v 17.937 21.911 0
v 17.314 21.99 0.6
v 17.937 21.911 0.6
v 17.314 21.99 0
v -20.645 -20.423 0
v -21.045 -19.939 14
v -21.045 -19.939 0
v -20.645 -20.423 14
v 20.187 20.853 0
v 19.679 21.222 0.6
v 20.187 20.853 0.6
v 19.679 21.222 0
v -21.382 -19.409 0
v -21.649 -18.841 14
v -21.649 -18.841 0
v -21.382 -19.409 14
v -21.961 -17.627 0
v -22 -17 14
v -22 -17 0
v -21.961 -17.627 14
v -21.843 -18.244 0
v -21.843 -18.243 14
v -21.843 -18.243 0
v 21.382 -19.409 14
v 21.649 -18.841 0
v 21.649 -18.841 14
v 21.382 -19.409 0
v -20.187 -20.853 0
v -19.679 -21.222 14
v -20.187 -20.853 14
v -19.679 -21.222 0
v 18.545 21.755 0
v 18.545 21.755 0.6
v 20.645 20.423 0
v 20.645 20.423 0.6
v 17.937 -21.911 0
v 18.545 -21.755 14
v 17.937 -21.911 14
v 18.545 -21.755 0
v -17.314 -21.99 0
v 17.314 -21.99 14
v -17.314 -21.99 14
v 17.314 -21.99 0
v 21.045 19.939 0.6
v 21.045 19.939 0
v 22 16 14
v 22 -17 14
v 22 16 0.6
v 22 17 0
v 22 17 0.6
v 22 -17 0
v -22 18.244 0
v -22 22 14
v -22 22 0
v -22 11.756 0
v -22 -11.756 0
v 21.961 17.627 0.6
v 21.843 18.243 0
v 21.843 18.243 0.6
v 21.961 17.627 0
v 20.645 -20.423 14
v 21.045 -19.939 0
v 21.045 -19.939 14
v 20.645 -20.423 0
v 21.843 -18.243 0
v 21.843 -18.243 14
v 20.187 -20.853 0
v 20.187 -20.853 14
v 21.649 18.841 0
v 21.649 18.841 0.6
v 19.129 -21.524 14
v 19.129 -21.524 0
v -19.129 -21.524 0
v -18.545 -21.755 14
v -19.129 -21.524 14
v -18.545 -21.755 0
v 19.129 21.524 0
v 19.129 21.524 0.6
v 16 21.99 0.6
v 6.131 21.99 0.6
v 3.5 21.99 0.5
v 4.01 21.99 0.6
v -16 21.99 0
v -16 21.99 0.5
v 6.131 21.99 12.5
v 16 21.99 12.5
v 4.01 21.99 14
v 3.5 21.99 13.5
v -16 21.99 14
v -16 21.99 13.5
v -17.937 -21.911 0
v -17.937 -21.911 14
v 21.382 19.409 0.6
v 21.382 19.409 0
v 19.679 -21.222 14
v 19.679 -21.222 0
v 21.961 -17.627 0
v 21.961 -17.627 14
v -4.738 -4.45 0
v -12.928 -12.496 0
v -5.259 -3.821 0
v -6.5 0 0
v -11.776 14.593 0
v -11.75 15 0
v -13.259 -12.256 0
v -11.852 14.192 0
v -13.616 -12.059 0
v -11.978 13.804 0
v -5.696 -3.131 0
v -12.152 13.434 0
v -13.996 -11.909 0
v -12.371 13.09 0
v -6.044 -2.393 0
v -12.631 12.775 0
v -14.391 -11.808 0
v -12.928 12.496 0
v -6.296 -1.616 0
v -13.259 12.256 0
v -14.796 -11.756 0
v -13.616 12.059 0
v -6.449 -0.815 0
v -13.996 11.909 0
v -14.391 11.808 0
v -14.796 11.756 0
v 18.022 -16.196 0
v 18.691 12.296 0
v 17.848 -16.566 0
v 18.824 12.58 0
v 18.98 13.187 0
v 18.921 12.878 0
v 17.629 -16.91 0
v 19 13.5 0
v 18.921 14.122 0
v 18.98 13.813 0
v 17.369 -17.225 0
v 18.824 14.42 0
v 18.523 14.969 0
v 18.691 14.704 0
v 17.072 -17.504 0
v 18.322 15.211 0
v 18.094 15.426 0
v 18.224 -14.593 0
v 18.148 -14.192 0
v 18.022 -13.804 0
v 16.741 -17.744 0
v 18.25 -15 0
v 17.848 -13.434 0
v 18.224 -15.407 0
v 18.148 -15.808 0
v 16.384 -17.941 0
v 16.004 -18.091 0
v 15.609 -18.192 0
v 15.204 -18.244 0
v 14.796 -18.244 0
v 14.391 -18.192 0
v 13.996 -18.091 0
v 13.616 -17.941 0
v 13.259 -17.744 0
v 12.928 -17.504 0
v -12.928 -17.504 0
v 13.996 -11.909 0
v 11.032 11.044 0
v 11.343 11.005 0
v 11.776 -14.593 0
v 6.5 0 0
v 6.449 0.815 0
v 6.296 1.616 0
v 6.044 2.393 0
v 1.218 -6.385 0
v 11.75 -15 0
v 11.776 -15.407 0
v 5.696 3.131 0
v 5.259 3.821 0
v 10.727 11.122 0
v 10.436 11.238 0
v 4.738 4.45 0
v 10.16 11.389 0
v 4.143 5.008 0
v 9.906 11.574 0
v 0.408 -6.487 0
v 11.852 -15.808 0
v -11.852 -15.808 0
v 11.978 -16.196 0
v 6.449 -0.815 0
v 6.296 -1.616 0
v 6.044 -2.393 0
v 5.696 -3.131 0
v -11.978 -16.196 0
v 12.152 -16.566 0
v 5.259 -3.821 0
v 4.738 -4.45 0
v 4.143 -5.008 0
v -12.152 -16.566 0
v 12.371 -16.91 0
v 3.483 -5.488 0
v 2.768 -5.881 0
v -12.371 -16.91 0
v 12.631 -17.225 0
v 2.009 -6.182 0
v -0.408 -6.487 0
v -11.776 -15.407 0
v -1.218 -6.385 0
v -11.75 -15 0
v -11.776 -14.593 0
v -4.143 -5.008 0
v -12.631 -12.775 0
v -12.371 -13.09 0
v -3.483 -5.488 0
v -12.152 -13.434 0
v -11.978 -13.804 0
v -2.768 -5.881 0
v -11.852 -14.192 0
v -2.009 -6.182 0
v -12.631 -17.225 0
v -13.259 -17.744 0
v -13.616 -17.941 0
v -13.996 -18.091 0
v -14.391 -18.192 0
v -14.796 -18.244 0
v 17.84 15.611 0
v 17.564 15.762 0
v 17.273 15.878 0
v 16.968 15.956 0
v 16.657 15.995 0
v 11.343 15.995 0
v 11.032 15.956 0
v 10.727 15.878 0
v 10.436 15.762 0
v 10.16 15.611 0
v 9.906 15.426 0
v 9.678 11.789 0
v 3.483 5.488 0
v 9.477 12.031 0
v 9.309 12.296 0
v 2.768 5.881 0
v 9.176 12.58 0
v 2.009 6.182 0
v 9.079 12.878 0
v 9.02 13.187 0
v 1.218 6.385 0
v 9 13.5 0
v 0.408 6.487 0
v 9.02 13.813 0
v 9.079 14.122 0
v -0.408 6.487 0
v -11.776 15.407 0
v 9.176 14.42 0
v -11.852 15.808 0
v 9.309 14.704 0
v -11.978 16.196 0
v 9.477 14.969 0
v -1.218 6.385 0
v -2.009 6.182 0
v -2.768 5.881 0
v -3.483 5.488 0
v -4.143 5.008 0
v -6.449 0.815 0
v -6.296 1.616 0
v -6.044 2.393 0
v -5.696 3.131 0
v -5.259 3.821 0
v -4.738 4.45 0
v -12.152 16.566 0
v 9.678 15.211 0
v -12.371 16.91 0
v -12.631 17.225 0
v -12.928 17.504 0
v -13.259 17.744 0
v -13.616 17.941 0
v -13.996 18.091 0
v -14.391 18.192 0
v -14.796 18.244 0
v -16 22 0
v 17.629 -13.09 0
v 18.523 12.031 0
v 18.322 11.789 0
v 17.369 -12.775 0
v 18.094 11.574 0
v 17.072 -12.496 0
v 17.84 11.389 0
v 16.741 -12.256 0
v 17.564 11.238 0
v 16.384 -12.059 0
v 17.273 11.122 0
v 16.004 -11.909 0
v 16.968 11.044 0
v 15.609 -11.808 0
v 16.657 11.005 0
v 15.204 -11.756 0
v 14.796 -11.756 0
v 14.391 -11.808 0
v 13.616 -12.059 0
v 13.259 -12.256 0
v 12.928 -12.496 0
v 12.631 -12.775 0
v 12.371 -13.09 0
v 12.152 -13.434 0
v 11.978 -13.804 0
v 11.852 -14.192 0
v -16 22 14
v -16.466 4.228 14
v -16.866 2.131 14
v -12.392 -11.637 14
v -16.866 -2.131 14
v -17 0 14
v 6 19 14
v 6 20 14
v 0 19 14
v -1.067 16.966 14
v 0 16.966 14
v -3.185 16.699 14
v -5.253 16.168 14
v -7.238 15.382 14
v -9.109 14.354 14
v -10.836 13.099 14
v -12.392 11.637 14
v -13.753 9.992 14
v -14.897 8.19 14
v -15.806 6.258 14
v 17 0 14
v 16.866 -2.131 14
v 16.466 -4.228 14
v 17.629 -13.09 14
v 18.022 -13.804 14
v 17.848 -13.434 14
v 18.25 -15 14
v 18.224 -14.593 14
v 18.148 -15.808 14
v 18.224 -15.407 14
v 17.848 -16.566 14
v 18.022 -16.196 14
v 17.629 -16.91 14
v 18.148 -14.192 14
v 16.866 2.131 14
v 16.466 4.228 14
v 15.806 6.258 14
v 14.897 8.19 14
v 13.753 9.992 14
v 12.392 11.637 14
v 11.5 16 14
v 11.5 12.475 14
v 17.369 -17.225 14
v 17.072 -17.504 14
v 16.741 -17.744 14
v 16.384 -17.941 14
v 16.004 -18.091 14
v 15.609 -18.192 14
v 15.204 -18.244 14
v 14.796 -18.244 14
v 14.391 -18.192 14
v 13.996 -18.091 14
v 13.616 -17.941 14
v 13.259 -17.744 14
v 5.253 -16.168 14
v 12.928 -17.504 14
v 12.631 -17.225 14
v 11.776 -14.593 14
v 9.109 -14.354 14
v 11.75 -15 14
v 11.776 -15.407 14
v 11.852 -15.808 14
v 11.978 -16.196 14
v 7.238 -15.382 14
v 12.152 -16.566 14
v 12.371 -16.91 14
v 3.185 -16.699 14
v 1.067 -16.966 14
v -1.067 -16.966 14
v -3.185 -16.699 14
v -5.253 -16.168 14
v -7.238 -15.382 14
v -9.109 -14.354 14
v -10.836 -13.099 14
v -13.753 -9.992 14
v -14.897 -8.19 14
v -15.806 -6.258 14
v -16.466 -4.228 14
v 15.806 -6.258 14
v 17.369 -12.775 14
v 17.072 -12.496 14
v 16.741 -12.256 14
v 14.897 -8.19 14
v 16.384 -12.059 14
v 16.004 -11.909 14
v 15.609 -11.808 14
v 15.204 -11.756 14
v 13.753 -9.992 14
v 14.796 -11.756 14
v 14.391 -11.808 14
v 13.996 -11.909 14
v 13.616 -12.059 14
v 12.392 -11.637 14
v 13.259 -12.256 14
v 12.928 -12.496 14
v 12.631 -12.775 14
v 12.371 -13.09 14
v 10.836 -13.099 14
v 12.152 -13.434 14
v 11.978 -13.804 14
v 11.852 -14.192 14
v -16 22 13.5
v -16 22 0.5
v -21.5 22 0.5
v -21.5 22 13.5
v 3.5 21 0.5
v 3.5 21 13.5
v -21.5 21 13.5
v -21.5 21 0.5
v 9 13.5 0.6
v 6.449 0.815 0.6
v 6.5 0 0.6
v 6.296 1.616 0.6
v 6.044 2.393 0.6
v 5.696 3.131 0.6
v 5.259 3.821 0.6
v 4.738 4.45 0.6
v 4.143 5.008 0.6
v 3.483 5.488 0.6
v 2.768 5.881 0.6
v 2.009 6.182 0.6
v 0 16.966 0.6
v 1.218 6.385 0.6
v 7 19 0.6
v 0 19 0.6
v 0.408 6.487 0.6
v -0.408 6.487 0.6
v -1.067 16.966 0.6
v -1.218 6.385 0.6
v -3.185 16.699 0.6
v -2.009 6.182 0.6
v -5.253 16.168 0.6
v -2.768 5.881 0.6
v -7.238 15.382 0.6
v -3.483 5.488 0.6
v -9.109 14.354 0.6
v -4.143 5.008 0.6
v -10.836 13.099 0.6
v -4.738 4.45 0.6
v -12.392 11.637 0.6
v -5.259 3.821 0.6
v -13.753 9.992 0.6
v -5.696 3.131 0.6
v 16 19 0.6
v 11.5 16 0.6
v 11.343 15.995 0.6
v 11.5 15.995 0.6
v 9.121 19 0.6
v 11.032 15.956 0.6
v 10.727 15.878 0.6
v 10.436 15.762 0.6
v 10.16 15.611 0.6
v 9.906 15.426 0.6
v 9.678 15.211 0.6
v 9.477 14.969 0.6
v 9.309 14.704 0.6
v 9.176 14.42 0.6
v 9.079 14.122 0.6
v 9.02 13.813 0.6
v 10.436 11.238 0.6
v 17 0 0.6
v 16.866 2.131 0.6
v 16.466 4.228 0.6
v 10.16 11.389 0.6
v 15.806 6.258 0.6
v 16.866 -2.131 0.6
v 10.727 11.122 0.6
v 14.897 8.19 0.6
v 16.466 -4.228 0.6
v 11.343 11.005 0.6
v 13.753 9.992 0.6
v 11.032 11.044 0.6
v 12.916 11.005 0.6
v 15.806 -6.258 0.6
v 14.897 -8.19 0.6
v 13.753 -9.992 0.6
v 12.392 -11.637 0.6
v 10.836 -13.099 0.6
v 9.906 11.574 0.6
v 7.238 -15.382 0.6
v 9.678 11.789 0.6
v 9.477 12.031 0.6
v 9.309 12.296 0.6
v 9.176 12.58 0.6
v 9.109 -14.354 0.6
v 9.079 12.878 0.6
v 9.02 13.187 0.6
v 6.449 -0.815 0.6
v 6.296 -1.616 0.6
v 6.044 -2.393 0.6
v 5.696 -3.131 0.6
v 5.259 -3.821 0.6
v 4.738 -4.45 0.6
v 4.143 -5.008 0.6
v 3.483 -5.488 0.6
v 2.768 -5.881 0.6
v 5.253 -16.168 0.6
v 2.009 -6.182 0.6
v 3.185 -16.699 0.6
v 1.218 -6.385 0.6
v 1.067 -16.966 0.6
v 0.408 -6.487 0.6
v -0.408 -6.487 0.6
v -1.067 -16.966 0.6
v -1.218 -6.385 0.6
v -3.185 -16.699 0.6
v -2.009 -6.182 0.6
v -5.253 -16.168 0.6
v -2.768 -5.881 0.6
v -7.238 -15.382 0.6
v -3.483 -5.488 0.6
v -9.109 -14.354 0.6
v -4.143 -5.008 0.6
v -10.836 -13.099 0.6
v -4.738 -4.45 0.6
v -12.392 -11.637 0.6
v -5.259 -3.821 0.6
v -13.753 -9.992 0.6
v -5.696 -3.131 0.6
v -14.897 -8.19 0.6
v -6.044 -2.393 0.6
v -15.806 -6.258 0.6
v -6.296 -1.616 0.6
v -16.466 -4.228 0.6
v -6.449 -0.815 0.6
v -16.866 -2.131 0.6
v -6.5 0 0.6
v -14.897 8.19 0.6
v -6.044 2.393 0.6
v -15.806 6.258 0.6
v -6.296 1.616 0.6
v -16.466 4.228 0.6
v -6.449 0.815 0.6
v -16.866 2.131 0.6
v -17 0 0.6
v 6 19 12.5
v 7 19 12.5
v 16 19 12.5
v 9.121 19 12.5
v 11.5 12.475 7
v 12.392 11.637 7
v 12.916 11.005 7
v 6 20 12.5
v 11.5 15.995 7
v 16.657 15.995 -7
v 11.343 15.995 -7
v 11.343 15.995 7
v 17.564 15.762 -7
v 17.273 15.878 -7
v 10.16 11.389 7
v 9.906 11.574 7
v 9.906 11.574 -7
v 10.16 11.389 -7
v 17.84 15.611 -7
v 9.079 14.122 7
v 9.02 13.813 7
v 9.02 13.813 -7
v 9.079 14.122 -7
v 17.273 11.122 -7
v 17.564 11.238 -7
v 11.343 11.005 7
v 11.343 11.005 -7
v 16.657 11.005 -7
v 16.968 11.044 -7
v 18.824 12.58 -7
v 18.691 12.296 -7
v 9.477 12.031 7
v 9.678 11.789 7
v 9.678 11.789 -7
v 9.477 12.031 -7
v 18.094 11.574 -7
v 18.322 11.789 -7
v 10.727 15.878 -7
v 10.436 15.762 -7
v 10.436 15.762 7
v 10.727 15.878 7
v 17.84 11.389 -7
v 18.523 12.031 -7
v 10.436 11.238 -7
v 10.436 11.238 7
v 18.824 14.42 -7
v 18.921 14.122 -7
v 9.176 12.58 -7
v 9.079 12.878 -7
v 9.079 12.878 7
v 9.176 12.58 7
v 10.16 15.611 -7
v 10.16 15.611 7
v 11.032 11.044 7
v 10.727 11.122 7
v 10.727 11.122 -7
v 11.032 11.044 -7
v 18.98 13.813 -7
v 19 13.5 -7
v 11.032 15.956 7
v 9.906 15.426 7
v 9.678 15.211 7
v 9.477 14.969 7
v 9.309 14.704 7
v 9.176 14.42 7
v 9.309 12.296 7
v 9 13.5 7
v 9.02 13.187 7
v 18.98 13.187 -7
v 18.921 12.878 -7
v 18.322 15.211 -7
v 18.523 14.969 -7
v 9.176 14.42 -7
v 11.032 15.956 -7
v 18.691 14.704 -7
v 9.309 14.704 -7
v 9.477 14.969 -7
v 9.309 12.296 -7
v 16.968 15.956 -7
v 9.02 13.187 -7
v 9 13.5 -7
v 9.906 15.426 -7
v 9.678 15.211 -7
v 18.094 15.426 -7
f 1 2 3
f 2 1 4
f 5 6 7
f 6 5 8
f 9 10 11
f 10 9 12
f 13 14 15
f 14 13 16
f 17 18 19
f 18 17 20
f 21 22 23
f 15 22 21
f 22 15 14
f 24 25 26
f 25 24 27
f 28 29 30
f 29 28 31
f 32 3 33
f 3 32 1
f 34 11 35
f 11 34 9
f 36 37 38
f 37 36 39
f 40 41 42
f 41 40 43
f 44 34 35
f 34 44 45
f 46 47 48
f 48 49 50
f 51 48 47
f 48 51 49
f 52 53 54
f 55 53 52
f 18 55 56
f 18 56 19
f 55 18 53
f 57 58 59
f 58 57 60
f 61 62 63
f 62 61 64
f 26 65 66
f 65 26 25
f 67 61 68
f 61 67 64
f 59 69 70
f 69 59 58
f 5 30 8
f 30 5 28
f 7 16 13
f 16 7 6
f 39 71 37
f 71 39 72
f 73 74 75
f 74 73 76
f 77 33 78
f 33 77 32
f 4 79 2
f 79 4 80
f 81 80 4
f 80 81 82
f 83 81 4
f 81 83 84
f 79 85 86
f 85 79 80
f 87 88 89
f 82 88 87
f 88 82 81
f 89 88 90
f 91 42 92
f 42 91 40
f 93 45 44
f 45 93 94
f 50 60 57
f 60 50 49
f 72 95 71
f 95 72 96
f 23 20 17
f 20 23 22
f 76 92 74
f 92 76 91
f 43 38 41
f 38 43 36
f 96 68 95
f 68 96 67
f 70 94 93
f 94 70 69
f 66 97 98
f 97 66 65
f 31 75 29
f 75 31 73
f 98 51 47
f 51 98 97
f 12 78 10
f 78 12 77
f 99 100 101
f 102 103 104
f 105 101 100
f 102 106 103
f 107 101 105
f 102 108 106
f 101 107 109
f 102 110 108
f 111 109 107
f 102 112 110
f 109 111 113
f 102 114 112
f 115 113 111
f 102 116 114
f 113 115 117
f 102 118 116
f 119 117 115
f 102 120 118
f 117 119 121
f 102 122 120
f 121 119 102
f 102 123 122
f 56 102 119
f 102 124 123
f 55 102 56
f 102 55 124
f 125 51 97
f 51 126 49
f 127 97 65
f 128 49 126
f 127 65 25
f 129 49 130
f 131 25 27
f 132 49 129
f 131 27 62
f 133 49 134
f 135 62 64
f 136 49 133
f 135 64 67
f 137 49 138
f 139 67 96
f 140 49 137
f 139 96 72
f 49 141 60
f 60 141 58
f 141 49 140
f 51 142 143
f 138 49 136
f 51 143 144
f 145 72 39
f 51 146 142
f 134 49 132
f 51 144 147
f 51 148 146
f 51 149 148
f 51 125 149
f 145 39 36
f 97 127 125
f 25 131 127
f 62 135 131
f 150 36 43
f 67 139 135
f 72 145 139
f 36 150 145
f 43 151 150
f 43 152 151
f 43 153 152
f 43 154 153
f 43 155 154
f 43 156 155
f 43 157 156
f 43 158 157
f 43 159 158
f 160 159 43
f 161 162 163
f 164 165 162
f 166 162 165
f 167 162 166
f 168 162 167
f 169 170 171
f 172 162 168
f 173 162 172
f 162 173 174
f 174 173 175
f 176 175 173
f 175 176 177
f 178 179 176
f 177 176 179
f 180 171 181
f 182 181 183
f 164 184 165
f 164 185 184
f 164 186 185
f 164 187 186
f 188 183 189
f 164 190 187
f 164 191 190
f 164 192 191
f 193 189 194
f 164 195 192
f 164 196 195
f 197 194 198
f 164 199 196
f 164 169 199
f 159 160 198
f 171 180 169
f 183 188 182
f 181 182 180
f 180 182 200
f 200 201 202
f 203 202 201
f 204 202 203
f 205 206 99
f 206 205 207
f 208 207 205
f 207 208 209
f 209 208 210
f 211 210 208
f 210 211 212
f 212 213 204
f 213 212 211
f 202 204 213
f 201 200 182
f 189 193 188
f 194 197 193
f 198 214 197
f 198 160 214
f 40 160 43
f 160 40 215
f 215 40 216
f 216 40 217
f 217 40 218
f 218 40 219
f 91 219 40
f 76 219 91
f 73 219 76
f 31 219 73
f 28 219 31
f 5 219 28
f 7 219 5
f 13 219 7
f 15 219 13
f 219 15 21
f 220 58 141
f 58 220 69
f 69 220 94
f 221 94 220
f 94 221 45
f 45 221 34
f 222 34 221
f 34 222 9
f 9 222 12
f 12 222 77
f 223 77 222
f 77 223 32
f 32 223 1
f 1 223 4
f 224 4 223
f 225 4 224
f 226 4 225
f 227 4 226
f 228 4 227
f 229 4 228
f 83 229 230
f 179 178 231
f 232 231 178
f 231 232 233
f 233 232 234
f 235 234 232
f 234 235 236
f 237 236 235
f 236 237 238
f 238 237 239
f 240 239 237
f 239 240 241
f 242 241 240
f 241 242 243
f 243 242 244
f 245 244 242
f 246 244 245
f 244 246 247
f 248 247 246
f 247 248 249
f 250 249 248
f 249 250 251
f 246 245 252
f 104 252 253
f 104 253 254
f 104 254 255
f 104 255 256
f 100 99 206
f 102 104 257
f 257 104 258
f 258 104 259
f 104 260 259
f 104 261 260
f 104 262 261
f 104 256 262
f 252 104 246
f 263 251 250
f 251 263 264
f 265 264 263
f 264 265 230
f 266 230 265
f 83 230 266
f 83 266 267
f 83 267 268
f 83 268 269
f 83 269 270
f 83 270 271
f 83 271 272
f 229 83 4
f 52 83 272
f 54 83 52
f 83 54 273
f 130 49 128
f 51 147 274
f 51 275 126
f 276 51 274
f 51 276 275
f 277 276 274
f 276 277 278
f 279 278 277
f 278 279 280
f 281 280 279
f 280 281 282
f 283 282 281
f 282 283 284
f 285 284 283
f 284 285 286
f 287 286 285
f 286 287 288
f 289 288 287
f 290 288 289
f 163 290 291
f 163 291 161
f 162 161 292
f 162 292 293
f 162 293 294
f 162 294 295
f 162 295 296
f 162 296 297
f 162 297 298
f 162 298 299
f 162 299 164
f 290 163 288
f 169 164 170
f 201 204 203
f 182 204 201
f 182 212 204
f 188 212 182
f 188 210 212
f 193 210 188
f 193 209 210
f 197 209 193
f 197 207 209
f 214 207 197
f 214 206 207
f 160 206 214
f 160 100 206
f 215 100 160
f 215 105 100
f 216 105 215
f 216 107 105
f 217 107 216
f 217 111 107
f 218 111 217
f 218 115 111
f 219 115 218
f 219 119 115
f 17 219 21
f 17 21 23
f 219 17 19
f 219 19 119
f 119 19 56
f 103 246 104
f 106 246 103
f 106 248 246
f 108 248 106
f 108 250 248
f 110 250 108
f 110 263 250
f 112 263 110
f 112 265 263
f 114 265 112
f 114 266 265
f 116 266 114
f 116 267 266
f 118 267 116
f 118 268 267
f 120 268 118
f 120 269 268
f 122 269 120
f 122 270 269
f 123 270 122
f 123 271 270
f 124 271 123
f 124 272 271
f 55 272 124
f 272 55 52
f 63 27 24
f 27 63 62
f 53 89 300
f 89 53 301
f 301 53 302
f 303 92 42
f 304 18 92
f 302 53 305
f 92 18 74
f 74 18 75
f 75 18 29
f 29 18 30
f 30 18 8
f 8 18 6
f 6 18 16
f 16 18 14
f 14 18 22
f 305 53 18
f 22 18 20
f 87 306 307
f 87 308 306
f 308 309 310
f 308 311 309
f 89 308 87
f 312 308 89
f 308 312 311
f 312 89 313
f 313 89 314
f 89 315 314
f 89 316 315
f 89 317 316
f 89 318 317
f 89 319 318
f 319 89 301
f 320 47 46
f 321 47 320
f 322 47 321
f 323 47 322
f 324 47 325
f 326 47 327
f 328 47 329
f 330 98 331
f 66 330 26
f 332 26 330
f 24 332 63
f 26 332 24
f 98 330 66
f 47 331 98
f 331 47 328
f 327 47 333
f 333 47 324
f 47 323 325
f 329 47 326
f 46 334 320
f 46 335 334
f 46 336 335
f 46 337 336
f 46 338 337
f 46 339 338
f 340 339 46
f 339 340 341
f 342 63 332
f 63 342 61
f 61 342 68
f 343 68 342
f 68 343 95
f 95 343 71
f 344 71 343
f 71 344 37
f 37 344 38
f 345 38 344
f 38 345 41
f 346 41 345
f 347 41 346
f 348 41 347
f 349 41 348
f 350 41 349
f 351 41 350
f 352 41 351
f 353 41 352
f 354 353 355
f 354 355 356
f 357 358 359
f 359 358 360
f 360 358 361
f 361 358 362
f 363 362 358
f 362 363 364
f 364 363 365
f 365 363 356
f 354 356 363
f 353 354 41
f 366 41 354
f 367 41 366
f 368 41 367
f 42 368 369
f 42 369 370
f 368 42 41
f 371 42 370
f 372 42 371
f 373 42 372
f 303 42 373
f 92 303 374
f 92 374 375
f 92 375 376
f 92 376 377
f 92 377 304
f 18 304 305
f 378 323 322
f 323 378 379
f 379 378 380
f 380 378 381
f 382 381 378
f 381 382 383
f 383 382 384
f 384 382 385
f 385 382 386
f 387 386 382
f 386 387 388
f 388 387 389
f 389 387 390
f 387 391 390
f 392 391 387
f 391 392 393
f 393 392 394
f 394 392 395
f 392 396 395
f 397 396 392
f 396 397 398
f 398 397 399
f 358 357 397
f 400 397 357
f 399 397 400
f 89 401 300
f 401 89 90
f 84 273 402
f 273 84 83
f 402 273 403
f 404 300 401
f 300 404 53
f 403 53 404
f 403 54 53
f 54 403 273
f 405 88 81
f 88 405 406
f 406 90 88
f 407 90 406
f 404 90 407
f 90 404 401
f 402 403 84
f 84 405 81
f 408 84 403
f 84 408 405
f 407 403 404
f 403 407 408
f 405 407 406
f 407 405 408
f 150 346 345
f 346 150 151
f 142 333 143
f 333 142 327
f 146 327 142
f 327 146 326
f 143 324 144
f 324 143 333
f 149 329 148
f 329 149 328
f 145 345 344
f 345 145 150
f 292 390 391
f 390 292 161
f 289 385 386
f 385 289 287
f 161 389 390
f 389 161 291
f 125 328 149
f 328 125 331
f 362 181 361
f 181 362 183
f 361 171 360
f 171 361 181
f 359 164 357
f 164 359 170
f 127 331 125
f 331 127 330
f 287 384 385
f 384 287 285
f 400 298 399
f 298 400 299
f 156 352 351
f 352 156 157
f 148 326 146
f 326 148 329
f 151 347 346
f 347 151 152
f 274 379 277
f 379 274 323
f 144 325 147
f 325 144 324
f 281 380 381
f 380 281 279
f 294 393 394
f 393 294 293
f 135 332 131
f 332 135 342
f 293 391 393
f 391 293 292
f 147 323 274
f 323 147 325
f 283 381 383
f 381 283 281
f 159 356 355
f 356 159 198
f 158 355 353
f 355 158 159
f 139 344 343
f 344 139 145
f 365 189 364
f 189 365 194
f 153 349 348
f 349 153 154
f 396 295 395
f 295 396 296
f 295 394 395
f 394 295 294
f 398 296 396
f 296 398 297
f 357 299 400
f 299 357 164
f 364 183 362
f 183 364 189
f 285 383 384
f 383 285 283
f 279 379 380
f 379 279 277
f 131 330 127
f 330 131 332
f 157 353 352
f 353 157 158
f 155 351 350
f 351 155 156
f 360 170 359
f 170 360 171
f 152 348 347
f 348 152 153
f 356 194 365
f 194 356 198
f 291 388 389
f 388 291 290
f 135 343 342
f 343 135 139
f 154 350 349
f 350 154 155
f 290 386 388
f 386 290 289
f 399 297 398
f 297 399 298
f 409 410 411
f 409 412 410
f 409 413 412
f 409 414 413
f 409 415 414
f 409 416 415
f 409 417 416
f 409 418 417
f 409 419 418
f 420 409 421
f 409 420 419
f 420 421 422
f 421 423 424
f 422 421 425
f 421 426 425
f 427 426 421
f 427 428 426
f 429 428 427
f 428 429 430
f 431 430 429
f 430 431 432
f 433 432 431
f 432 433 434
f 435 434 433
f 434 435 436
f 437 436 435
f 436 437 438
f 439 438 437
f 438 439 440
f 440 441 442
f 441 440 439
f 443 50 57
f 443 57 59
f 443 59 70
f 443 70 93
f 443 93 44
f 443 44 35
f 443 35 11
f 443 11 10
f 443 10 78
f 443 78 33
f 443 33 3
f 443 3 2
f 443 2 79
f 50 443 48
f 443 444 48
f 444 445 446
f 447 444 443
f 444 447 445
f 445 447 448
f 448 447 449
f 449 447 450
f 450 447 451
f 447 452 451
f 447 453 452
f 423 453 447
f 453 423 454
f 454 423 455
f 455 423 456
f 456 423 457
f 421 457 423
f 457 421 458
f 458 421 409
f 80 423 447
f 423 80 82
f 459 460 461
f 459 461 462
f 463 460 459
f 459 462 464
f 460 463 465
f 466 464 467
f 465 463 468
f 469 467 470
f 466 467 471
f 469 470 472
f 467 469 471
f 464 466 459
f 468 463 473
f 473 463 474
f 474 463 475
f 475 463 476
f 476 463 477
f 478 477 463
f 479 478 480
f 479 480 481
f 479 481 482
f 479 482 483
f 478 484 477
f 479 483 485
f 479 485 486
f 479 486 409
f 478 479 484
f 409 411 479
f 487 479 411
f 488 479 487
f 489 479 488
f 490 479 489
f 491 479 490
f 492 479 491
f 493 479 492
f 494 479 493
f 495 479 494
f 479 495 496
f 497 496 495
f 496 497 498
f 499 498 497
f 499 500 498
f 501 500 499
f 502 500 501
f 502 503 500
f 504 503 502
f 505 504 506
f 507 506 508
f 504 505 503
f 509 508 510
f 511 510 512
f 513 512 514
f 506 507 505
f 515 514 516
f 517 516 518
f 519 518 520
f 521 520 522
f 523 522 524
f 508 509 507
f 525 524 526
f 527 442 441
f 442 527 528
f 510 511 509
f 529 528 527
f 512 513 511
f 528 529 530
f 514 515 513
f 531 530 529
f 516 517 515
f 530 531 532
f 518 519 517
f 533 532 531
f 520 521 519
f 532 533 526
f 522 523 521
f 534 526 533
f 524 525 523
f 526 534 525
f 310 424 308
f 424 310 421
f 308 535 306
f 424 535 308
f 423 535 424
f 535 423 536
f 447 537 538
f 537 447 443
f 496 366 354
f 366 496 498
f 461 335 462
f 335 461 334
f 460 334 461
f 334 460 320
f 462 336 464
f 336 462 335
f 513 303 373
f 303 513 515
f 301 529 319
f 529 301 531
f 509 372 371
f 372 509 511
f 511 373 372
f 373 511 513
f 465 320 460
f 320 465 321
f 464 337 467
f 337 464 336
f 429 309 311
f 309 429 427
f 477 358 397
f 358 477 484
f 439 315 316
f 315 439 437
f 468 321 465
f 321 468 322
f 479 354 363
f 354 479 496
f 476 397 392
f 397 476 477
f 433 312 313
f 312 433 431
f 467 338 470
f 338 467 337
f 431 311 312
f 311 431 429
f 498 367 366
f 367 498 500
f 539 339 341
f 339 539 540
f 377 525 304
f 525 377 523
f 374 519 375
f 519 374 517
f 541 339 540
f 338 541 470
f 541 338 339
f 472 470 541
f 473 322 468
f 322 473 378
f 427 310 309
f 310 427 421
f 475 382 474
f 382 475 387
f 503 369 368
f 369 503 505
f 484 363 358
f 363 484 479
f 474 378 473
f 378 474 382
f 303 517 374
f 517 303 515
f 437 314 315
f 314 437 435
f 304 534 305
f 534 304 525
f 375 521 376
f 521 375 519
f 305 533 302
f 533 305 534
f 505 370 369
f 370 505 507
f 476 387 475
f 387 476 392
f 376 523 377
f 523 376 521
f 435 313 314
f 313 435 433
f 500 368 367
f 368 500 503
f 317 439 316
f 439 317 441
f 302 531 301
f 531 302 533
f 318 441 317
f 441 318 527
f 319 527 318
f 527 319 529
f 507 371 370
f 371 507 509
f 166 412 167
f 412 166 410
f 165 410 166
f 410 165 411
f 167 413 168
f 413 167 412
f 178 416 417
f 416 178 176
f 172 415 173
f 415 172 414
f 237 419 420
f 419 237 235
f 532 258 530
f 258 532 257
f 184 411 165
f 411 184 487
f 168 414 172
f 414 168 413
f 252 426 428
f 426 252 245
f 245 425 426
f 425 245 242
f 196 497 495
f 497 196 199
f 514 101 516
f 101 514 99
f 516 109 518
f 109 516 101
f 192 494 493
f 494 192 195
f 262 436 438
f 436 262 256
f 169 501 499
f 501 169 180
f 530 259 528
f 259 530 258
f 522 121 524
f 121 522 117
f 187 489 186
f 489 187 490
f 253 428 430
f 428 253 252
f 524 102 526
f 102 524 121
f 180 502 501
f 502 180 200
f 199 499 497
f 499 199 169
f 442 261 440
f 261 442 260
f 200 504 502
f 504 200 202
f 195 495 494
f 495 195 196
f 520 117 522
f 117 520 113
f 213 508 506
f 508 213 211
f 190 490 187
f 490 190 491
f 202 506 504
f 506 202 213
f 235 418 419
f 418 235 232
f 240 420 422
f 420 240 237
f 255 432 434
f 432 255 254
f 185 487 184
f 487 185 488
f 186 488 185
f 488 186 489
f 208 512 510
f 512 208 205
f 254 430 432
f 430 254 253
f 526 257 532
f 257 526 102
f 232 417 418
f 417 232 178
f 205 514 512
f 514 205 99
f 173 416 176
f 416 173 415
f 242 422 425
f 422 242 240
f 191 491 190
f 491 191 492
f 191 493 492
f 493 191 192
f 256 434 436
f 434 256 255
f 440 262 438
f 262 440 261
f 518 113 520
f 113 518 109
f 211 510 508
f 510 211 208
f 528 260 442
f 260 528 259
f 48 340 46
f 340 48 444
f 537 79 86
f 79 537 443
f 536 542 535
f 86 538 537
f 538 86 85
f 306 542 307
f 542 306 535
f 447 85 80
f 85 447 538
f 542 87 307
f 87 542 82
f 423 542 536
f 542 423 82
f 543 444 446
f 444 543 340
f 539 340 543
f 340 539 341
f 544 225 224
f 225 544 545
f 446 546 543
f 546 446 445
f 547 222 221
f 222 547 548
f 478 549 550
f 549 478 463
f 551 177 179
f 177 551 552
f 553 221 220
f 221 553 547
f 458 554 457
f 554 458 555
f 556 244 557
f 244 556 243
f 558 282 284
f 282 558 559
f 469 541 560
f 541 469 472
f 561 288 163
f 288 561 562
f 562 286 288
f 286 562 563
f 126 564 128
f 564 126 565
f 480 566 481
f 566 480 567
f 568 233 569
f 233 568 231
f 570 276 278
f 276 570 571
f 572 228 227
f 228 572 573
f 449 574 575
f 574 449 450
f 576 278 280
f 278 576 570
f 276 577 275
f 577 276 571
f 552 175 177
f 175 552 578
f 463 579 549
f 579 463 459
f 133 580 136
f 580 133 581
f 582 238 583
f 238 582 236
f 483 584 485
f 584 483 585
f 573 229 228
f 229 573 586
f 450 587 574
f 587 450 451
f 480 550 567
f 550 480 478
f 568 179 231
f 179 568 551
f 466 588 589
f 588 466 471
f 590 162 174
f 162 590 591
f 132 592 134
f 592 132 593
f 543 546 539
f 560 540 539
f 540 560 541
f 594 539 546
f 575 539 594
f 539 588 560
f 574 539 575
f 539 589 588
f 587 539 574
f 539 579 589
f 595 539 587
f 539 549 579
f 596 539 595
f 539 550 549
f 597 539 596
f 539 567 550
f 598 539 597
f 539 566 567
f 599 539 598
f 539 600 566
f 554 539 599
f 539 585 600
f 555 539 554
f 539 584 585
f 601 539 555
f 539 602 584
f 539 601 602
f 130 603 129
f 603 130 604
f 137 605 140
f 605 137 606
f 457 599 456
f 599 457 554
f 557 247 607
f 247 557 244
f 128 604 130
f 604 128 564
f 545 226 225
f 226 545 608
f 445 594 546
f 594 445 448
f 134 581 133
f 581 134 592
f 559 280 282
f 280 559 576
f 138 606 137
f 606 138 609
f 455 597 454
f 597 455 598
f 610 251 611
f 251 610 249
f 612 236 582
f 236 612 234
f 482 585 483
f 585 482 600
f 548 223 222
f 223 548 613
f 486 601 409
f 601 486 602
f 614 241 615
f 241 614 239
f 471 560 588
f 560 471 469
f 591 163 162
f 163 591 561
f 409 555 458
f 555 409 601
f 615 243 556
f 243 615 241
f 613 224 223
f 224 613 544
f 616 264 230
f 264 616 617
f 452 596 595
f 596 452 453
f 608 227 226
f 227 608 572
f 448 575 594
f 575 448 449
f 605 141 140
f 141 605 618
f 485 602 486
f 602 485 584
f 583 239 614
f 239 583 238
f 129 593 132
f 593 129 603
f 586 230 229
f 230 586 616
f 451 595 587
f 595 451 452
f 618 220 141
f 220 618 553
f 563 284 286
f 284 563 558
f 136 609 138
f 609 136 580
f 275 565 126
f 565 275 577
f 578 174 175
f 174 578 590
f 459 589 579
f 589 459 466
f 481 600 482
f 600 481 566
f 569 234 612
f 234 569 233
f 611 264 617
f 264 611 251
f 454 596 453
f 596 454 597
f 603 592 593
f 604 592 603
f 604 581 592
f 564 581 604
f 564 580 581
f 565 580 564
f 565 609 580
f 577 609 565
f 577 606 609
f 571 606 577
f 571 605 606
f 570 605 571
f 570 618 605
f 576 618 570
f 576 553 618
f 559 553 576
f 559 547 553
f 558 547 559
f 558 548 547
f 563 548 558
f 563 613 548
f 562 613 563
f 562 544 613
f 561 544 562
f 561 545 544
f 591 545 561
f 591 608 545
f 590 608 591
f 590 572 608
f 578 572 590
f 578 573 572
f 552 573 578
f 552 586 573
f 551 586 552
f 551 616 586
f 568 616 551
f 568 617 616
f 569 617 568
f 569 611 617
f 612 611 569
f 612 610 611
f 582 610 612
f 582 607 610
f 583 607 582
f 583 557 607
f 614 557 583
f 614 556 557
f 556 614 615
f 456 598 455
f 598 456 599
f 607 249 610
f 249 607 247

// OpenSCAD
$fn = 50;


union() {
	difference() {
		union() {
			hull() {
				translate(v = [-17.0000000000, 17.0000000000, 0]) {
					cylinder(h = 14, r = 5);
				}
				translate(v = [17.0000000000, 17.0000000000, 0]) {
					cylinder(h = 14, r = 5);
				}
				translate(v = [-17.0000000000, -17.0000000000, 0]) {
					cylinder(h = 14, r = 5);
				}
				translate(v = [17.0000000000, -17.0000000000, 0]) {
					cylinder(h = 14, r = 5);
				}
			}
			translate(v = [-22.0000000000, 16.0000000000, 0]) {
				cube(size = [6, 6, 14]);
			}
		}
		union() {
			translate(v = [-22.5000000000, -15.0000000000, -250.0000000000]) {
				rotate(a = [0, 0, 0]) {
					difference() {
						union() {
							hull() {
								translate(v = [7.5000000000, 0, 0]) {
									cylinder(h = 250, r = 3.2500000000, r1 = 3.2500000000, r2 = 3.2500000000);
								}
								translate(v = [-7.5000000000, 0, 0]) {
									cylinder(h = 250, r = 3.2500000000, r1 = 3.2500000000, r2 = 3.2500000000);
								}
							}
						}
						union();
					}
				}
			}
			translate(v = [-22.5000000000, 15.0000000000, -250.0000000000]) {
				rotate(a = [0, 0, 0]) {
					difference() {
						union() {
							hull() {
								translate(v = [7.5000000000, 0, 0]) {
									cylinder(h = 250, r = 3.2500000000, r1 = 3.2500000000, r2 = 3.2500000000);
								}
								translate(v = [-7.5000000000, 0, 0]) {
									cylinder(h = 250, r = 3.2500000000, r1 = 3.2500000000, r2 = 3.2500000000);
								}
							}
						}
						union();
					}
				}
			}
			translate(v = [-21.5000000000, 21.0000000000, 0.5000000000]) {
				cube(size = [25, 1, 13.0000000000]);
			}
			translate(v = [15.0000000000, -15.0000000000, 0]) {
				cylinder(h = 100, r = 3.2500000000);
			}
			translate(v = [0.0000000000, 11.0000000000, 0.6000000000]) {
				cube(size = [11, 8, 16.4000000000]);
			}
			translate(v = [0, 0, 0.6000000000]) {
				cylinder(h = 16.4000000000, r = 17.0000000000);
			}
			translate(v = [0, 0, -7.0000000000]) {
				cylinder(h = 14, r = 6.5000000000);
			}
			translate(v = [0.0000000000, 16.0000000000, 0.6000000000]) {
				cube(size = [22.0000000000, 3, 16.4000000000]);
			}
			translate(v = [16.0000000000, 16.0000000000, 0.6000000000]) {
				cube(size = [6, 6, 16.4000000000]);
			}
			translate(v = [6.0000000000, 16.0000000000, 12.5000000000]) {
				cube(size = [16, 6, 1.5000000000]);
			}
			translate(v = [3.2500000000, 22.7500000000, 0.6000000000]) {
				rotate(a = [0, 0, -45]) {
					cube(size = [7.5000000000, 1.5000000000, 16.4000000000]);
				}
			}
			translate(v = [2.5000000000, 11.0000000000, 0.6000000000]) {
				cube(size = [9.0000000000, 5, 13.4000000000]);
			}
		}
	}
	union() {
		translate(v = [14, 13.5000000000, -7.0000000000]) {
			rotate(a = [0, 0, 0]) {
				difference() {
					union() {
						#hull() {
							#translate(v = [2.5000000000, 0, 0]) {
								cylinder(h = 14, r = 2.5000000000, r1 = 2.5000000000, r2 = 2.5000000000);
							}
							#translate(v = [-2.5000000000, 0, 0]) {
								cylinder(h = 14, r = 2.5000000000, r1 = 2.5000000000, r2 = 2.5000000000);
							}
						}
					}
					union();
				}
			}
		}
	}
}
